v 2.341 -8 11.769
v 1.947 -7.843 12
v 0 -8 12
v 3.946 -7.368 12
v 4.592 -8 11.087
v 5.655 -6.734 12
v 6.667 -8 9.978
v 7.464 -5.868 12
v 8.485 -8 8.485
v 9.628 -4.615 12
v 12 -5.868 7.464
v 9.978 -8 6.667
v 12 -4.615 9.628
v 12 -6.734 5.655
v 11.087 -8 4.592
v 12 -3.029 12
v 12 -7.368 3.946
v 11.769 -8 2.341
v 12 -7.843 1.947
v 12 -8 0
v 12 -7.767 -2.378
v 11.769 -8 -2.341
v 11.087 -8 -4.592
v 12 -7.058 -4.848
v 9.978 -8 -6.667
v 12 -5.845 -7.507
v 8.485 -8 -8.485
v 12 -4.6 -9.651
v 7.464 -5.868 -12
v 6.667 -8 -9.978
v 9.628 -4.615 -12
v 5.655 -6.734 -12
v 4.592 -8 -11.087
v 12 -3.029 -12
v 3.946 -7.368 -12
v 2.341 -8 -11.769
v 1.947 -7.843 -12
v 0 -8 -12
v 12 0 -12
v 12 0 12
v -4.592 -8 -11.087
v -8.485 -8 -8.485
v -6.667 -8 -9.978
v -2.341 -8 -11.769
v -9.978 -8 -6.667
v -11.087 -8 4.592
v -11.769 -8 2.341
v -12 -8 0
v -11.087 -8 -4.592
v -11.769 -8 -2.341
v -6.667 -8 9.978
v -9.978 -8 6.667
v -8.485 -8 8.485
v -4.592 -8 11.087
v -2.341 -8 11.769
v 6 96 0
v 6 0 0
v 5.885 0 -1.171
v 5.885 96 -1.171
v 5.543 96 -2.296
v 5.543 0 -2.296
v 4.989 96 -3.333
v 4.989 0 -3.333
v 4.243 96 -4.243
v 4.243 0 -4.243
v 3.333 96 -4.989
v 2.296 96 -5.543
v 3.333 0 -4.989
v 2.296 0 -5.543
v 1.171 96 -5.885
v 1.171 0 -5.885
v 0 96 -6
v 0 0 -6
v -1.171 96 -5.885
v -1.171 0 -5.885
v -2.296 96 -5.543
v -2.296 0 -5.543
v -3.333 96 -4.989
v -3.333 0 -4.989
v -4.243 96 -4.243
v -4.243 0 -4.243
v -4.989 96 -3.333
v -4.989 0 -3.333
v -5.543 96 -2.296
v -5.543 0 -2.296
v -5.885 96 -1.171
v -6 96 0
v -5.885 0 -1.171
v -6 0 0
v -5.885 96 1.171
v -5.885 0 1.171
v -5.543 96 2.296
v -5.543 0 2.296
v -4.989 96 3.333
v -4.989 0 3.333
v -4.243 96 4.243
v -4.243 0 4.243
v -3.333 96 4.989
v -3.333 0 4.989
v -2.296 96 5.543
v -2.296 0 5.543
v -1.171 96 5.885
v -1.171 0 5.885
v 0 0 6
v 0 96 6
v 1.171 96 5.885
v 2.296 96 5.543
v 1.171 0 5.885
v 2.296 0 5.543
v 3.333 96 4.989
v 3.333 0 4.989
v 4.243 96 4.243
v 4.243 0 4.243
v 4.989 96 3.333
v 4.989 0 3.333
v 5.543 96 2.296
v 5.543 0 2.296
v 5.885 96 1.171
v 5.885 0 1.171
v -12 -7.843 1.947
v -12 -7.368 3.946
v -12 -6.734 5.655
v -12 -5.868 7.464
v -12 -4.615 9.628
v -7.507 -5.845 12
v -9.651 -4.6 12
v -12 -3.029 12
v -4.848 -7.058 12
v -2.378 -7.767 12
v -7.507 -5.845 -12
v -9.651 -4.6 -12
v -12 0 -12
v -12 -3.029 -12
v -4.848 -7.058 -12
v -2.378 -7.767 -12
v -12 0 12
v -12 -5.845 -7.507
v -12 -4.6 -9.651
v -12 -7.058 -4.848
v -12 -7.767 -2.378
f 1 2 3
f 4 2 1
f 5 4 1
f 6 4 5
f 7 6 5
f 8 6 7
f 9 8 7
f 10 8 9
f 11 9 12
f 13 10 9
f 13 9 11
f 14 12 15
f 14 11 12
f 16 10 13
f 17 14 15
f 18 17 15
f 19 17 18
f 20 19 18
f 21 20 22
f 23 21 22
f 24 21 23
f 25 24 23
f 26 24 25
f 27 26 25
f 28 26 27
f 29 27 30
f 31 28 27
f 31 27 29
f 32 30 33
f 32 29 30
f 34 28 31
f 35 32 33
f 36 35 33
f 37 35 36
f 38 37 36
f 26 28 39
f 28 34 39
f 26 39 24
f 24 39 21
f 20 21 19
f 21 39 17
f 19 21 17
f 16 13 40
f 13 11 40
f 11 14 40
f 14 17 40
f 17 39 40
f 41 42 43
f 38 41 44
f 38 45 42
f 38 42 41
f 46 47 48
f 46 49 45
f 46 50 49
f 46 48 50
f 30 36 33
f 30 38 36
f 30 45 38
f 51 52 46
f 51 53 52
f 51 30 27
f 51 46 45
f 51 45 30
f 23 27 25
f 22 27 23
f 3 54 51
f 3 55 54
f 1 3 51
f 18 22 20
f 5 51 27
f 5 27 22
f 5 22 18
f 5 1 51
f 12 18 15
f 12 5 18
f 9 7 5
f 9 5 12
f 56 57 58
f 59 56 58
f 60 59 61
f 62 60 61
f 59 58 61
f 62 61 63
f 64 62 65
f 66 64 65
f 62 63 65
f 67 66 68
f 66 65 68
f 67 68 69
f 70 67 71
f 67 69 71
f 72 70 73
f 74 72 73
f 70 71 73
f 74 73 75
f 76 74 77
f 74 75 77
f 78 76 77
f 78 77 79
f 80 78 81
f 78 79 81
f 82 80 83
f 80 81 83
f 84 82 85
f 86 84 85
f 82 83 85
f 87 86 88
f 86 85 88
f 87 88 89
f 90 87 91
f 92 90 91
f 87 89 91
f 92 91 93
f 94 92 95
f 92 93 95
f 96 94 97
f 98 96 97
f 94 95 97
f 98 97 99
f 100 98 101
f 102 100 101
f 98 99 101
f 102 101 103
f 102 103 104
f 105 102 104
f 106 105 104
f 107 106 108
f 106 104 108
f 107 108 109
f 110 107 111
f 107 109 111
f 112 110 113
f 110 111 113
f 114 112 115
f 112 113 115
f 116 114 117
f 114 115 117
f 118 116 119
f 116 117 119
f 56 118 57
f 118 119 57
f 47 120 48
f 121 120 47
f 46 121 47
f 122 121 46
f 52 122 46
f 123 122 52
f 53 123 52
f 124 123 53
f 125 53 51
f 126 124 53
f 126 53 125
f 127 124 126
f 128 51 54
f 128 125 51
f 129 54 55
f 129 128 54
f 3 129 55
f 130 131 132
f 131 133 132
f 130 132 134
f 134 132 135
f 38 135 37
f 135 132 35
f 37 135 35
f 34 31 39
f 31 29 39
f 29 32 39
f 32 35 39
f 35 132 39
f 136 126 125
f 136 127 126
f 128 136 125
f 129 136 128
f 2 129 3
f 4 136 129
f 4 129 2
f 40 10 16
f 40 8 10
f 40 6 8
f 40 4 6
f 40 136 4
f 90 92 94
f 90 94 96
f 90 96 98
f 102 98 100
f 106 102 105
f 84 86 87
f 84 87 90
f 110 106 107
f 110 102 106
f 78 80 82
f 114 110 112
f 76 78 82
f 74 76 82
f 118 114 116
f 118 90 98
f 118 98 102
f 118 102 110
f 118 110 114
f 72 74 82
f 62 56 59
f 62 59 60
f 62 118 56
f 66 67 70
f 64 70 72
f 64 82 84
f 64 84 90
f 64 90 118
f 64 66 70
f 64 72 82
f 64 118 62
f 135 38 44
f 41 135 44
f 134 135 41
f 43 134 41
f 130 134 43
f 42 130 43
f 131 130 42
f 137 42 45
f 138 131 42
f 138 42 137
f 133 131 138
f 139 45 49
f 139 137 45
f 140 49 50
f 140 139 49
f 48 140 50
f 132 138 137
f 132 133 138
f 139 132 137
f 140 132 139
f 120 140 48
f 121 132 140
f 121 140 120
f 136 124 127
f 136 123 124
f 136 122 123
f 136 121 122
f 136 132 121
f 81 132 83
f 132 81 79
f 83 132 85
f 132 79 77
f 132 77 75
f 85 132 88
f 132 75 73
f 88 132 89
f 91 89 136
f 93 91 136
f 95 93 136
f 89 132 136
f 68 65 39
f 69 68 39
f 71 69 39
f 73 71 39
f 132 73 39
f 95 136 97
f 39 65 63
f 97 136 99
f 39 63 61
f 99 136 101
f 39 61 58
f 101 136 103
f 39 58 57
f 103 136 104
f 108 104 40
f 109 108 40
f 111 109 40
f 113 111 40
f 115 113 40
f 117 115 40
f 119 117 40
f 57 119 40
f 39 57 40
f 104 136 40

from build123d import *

# Parameters (mm, degrees)
SKETCH1_R           = 6
BOSS_EXTRUDE1_DEPTH = 96
SKETCH11_W          = 24
SKETCH11_H          = 24
BOSS_EXTRUDE5_DEPTH = 8
SKETCH12_OUTSIDE_W  = 63.88
SKETCH12_OUTSIDE_H  = 63.88
SKETCH12_OUTSIDE_R  = 12
CUT_EXTRUDE3_DEPTH  = 8
CUT_EXTRUDE3_TAPER  = 45


with BuildPart() as part:
    # Sketch1 → Boss-Extrude1 (new body)
    with BuildSketch(Plane(origin=(0, 0, 0), x_dir=(1, 0, 0), z_dir=(0, 1, 0))):
        Circle(SKETCH1_R)
    extrude(amount=BOSS_EXTRUDE1_DEPTH)

    # Sketch11 → Boss-Extrude5 (add)
    with BuildSketch(Plane.XZ):
        Rectangle(SKETCH11_W, SKETCH11_H)
    extrude(amount=BOSS_EXTRUDE5_DEPTH)

    # Sketch12 outside → Cut-Extrude3 (cut)
    with BuildSketch(Plane(origin=(0, -8, 0), x_dir=(-1, 0, 0), z_dir=(0, -1, 0))):
        Rectangle(SKETCH12_OUTSIDE_W, SKETCH12_OUTSIDE_H)
        Circle(SKETCH12_OUTSIDE_R, mode=Mode.SUBTRACT)
    extrude(amount=-CUT_EXTRUDE3_DEPTH, taper=CUT_EXTRUDE3_TAPER, mode=Mode.SUBTRACT)


solid = part.part
